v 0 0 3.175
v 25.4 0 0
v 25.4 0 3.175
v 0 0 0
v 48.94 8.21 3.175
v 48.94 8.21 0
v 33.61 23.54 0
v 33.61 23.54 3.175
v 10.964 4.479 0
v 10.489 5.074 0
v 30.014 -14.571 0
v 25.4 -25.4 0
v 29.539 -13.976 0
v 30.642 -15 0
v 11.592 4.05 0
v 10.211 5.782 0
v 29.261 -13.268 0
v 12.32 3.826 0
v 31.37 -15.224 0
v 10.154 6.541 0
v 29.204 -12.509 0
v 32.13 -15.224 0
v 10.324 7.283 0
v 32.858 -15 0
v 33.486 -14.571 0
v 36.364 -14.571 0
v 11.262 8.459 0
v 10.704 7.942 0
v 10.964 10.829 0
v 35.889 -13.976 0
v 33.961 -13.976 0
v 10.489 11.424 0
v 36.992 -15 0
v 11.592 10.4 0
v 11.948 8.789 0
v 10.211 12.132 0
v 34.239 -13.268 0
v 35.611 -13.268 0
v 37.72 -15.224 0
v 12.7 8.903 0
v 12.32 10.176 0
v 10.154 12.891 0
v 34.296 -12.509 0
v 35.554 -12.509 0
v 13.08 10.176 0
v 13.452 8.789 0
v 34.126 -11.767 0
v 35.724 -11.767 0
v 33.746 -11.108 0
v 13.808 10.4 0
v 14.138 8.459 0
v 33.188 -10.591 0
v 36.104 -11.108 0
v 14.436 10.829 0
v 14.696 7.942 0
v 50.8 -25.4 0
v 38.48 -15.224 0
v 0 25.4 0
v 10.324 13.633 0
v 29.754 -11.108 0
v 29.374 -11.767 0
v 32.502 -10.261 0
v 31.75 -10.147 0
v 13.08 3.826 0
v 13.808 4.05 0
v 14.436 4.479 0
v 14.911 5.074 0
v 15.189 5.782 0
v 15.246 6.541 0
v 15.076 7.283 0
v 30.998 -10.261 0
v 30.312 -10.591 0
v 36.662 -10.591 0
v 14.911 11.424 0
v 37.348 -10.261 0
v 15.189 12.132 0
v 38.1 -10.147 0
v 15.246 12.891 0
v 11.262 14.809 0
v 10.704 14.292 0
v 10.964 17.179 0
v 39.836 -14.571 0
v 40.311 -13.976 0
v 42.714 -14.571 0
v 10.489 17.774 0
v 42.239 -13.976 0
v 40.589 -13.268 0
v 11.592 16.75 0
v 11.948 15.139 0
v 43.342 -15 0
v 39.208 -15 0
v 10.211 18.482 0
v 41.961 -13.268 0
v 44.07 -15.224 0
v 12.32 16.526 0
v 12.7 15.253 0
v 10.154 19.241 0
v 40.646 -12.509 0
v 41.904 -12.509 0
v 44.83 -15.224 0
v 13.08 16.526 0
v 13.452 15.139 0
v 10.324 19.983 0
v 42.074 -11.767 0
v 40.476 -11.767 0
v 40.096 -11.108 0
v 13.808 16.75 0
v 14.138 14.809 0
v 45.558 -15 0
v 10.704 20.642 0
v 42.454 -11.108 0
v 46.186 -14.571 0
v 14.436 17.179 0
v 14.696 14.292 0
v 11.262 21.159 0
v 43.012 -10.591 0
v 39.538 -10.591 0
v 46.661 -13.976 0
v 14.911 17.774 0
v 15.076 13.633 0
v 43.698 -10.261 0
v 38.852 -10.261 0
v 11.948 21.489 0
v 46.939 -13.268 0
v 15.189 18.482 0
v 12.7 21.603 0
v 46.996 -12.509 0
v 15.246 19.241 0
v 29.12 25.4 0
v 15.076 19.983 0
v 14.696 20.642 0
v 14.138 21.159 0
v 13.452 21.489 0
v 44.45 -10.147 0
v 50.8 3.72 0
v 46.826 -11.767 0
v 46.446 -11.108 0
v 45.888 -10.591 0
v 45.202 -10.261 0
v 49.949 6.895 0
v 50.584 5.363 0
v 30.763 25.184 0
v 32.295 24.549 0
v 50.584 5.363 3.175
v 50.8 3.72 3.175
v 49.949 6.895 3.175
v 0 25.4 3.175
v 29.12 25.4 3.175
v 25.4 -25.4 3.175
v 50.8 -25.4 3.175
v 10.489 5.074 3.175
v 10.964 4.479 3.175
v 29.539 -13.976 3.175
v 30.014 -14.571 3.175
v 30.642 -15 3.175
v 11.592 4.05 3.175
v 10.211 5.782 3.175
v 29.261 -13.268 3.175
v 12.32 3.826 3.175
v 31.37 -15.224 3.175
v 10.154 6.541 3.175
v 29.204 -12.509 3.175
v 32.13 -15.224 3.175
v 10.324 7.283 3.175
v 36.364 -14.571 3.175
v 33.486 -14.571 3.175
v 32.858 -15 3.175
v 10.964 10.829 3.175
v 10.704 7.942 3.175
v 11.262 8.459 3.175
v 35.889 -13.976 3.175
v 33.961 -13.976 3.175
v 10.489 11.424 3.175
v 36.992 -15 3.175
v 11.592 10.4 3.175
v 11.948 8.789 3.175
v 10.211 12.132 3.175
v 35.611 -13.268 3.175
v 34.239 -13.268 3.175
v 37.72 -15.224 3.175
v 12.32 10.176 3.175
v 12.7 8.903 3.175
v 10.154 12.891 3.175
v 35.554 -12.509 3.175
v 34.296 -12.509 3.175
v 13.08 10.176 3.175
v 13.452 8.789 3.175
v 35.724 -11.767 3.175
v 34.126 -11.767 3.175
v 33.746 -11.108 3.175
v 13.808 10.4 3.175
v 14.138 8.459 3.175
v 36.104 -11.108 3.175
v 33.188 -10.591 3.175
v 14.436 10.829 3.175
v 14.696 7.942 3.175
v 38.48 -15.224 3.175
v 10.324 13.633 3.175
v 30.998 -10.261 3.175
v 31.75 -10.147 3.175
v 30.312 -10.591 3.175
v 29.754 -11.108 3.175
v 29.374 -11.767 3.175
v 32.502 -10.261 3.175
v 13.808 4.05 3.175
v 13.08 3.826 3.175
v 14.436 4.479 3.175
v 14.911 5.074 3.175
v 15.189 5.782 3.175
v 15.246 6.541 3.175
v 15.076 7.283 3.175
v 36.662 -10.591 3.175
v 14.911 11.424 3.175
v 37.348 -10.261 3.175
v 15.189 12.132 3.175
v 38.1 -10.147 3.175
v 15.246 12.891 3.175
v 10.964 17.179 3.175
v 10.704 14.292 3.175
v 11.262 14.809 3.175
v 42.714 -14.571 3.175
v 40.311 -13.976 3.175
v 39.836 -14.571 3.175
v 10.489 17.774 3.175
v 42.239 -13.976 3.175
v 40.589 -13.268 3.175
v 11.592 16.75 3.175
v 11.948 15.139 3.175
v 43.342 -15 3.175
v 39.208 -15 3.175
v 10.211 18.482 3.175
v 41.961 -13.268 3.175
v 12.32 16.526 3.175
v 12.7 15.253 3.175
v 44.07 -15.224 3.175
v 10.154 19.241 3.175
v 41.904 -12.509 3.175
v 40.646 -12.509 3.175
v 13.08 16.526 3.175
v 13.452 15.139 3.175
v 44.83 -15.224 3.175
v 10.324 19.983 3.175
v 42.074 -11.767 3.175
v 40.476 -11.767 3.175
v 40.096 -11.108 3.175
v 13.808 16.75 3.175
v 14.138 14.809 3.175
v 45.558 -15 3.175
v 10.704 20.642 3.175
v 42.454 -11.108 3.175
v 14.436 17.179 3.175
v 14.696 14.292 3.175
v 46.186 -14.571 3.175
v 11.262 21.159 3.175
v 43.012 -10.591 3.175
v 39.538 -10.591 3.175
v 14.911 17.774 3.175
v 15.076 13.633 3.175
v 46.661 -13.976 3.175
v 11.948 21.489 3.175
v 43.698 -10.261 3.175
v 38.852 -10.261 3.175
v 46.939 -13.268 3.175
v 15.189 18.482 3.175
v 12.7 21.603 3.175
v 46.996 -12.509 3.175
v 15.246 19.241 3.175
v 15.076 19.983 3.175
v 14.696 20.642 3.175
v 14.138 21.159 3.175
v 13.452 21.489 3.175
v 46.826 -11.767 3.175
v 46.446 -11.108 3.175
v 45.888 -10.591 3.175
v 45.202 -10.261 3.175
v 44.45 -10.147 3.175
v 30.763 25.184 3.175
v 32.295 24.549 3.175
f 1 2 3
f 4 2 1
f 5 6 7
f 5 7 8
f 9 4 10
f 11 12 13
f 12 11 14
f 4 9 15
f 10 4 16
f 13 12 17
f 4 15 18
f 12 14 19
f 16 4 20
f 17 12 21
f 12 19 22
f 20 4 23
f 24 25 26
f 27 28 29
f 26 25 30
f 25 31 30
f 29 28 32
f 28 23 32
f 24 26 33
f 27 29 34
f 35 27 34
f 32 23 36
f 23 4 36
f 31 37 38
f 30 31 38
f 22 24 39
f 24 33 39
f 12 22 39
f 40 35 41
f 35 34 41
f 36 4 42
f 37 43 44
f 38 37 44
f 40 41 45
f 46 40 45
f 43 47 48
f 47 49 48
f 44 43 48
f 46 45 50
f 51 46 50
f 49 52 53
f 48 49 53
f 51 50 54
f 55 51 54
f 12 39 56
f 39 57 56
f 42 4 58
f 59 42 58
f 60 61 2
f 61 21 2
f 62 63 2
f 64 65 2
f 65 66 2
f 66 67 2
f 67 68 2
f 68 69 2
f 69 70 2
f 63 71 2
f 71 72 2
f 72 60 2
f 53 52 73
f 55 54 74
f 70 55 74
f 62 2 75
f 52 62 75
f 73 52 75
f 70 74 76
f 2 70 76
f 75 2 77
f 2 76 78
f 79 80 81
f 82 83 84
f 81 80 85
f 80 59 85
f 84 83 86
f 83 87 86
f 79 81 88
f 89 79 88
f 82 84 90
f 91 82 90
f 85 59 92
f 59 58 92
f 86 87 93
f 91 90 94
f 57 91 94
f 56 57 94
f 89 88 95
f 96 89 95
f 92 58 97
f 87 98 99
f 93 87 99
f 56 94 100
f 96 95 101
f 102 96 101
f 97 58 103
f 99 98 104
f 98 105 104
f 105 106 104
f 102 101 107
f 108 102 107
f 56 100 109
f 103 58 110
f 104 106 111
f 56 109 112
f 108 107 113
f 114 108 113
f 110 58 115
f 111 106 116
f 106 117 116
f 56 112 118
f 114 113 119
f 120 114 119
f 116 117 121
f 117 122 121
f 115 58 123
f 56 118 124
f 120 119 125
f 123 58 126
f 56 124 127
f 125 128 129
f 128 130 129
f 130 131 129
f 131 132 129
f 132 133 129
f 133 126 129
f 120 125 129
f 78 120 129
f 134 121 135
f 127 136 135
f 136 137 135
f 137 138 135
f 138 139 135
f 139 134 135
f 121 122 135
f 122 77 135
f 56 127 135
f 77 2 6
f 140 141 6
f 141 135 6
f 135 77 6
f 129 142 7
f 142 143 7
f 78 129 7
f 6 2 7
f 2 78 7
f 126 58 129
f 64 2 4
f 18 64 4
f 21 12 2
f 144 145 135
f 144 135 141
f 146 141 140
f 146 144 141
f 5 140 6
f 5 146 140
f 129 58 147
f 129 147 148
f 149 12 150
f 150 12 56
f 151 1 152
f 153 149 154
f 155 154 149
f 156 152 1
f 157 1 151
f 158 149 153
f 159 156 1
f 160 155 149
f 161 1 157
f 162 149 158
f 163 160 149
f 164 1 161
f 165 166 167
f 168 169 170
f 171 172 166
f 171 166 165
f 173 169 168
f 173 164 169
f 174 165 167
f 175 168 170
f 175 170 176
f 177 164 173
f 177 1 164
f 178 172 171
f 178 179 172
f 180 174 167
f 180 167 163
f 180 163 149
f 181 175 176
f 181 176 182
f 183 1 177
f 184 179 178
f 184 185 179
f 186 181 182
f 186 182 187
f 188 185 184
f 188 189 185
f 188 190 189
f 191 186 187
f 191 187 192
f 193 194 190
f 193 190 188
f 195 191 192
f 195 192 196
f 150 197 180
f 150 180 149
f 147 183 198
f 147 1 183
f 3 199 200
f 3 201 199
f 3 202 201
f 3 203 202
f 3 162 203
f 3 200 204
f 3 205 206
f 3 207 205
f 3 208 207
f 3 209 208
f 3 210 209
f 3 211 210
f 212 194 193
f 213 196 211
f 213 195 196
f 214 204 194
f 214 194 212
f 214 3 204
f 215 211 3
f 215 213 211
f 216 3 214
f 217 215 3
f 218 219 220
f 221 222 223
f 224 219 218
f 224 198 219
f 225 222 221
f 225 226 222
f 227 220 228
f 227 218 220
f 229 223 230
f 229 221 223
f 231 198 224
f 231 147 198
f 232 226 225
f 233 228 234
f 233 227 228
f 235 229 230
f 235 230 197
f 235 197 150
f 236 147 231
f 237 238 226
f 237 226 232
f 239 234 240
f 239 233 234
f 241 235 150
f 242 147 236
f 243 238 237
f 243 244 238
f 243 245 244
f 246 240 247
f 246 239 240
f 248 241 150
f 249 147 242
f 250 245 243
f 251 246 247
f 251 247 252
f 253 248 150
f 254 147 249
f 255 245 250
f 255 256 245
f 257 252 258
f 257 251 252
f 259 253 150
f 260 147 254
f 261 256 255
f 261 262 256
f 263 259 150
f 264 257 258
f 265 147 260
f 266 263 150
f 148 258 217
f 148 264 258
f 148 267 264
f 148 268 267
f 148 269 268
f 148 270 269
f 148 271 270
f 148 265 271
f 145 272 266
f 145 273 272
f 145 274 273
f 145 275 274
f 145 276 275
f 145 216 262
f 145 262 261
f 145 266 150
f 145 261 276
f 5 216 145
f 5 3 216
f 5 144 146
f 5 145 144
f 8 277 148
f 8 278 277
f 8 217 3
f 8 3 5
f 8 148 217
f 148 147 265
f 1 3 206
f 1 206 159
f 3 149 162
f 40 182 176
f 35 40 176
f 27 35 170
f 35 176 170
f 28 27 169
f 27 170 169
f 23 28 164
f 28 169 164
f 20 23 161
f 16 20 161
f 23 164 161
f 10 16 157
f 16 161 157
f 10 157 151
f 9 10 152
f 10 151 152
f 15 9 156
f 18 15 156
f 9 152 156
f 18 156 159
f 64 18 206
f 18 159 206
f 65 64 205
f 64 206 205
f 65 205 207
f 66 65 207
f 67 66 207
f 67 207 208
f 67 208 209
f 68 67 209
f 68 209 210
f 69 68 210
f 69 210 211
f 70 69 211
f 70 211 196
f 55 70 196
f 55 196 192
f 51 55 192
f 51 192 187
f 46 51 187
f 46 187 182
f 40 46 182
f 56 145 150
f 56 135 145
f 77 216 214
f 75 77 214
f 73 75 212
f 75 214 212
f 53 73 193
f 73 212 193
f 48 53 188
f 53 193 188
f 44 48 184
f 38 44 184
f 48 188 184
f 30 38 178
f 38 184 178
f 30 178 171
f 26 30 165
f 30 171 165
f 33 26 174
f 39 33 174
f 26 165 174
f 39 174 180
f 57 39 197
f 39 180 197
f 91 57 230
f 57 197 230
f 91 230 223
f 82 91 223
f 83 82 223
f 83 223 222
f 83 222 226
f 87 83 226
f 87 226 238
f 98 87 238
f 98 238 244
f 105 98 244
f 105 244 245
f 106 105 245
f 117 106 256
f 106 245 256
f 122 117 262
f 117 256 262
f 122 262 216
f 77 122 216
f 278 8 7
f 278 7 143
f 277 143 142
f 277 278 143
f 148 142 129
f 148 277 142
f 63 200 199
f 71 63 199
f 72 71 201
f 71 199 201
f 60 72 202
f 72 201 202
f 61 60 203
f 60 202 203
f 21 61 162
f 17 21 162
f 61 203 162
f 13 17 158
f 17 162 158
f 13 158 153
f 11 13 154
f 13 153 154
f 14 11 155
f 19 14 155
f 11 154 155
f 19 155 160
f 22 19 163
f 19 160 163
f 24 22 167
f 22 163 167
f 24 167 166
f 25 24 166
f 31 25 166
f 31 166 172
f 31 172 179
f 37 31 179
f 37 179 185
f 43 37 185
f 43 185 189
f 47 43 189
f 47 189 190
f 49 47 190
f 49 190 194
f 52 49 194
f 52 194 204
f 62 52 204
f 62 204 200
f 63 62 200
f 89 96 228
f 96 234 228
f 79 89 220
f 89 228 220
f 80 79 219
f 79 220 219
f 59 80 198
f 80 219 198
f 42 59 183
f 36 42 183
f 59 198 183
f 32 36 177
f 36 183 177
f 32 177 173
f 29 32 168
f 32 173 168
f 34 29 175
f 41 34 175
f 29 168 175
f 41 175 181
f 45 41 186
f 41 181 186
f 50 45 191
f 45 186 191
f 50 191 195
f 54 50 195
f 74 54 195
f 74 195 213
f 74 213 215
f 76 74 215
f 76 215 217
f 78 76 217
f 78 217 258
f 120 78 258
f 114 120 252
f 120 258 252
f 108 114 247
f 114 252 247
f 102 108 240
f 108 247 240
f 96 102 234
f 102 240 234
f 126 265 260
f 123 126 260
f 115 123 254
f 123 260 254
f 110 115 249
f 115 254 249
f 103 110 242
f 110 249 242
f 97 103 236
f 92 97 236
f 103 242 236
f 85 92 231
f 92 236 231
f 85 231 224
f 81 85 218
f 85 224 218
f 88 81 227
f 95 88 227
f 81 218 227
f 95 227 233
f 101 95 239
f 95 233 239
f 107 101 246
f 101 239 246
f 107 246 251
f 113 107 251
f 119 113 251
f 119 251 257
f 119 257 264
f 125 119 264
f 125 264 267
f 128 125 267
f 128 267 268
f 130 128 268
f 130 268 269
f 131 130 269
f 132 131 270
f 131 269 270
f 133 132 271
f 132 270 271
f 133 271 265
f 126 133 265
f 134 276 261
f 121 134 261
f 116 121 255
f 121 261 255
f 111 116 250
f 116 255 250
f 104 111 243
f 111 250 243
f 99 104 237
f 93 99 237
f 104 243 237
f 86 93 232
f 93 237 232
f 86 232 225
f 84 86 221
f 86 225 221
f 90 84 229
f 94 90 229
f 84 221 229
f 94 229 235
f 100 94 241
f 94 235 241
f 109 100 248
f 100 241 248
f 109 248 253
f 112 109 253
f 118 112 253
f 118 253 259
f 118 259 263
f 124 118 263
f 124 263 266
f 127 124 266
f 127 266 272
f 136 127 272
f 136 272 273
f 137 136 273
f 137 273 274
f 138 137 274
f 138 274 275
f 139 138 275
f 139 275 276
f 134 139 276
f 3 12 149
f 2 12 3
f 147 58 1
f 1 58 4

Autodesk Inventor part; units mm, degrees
ref_plane "YZ Plane" through (0, 0, 0) normal (1, 0, 0) x (0, 1, 0)
ref_plane "XZ Plane" through (0, 0, 0) normal (0, 1, 0) x (-1, 0, 0)
ref_plane "XY Plane" through (0, 0, 0) normal (0, 0, 1) x (1, 0, 0)
sketch "Sketch1" plane through (0, 0, 0) normal (0, 0, 1) x (1, 0, 0)
  line L0 (0, 0) -> (25.4, 0) construction
  line L1 (25.4, 0) -> (25.4, 76.2) construction
  line L2 (25.4, 76.2) -> (0, 76.2) construction
  line L3 (0, 76.2) -> (0, 0) construction
  line L4 (25.4, 0) -> (101.6, 0) construction
  line L5 (101.6, 0) -> (101.6, -25.4) construction
  line L6 (101.6, -25.4) -> (25.4, -25.4) construction
  line L7 (25.4, -25.4) -> (25.4, 0) construction
  line L8 (25.4, 0) -> (0, 0)
  line L9 (0, 25.4) -> (0, 0)
  line L10 (0, 25.4) -> (50.8, 25.4)
  line L11 (50.8, 25.4) -> (50.8, -25.4)
  line L12 (25.4, -25.4) -> (50.8, -25.4)
  line L13 (25.4, -25.4) -> (25.4, 0)
  point P0 (12.7, 6.35)
  point P1 (12.7, 19.05)
  point P2 (12.7, 12.7)
  point P3 (12.7, 0)
  point P4 (31.75, -12.7)
  point P5 (38.1, -12.7)
  point P6 (44.45, -12.7)
  point P7 (25.4, -12.7)
  dimension "d0" = 25.4
  dimension "d1" = 76.2
  dimension "d2" = 76.2
  dimension "d3" = 25.4
  dimension "d4" = 31.75
  dimension "d5" = 6.35
  dimension "d6" = 6.35
  dimension "d7" = 6.35
  dimension "d8" = 6.35
  dimension "d9" = 31.75
  dimension "d10" = 25.4
  dimension "d11" = 25.4
extrude "Extrusion1" add sketch "Sketch1" along normal blind 3.175
hole "Hole1" at (12.7, 6.35, 0) at (12.7, 19.05, 0) at (12.7, 12.7, 0) at (31.75, -12.7, 0) at (38.1, -12.7, 0) at (44.45, -12.7, 0) direction (0, 0, 1) diameter 5.1054 end through all clearance for "Flat Head Machine Screw (82)" size "#10" standard "Ansi Unified Screw Threads"
chamfer "Chamfer1" distance 19.05 angle 45 1 edges at (50.8, 25.4, 1.5875)
fillet "Fillet2" radius 6.35 2 edges at (31.75, 25.4, 1.5875) (50.8, 6.35, 1.5875)
equation "\"d6\" = d5"
equation "\"d10\" = d11"
properties part number "EL2-010" material "Aluminum 6061"
